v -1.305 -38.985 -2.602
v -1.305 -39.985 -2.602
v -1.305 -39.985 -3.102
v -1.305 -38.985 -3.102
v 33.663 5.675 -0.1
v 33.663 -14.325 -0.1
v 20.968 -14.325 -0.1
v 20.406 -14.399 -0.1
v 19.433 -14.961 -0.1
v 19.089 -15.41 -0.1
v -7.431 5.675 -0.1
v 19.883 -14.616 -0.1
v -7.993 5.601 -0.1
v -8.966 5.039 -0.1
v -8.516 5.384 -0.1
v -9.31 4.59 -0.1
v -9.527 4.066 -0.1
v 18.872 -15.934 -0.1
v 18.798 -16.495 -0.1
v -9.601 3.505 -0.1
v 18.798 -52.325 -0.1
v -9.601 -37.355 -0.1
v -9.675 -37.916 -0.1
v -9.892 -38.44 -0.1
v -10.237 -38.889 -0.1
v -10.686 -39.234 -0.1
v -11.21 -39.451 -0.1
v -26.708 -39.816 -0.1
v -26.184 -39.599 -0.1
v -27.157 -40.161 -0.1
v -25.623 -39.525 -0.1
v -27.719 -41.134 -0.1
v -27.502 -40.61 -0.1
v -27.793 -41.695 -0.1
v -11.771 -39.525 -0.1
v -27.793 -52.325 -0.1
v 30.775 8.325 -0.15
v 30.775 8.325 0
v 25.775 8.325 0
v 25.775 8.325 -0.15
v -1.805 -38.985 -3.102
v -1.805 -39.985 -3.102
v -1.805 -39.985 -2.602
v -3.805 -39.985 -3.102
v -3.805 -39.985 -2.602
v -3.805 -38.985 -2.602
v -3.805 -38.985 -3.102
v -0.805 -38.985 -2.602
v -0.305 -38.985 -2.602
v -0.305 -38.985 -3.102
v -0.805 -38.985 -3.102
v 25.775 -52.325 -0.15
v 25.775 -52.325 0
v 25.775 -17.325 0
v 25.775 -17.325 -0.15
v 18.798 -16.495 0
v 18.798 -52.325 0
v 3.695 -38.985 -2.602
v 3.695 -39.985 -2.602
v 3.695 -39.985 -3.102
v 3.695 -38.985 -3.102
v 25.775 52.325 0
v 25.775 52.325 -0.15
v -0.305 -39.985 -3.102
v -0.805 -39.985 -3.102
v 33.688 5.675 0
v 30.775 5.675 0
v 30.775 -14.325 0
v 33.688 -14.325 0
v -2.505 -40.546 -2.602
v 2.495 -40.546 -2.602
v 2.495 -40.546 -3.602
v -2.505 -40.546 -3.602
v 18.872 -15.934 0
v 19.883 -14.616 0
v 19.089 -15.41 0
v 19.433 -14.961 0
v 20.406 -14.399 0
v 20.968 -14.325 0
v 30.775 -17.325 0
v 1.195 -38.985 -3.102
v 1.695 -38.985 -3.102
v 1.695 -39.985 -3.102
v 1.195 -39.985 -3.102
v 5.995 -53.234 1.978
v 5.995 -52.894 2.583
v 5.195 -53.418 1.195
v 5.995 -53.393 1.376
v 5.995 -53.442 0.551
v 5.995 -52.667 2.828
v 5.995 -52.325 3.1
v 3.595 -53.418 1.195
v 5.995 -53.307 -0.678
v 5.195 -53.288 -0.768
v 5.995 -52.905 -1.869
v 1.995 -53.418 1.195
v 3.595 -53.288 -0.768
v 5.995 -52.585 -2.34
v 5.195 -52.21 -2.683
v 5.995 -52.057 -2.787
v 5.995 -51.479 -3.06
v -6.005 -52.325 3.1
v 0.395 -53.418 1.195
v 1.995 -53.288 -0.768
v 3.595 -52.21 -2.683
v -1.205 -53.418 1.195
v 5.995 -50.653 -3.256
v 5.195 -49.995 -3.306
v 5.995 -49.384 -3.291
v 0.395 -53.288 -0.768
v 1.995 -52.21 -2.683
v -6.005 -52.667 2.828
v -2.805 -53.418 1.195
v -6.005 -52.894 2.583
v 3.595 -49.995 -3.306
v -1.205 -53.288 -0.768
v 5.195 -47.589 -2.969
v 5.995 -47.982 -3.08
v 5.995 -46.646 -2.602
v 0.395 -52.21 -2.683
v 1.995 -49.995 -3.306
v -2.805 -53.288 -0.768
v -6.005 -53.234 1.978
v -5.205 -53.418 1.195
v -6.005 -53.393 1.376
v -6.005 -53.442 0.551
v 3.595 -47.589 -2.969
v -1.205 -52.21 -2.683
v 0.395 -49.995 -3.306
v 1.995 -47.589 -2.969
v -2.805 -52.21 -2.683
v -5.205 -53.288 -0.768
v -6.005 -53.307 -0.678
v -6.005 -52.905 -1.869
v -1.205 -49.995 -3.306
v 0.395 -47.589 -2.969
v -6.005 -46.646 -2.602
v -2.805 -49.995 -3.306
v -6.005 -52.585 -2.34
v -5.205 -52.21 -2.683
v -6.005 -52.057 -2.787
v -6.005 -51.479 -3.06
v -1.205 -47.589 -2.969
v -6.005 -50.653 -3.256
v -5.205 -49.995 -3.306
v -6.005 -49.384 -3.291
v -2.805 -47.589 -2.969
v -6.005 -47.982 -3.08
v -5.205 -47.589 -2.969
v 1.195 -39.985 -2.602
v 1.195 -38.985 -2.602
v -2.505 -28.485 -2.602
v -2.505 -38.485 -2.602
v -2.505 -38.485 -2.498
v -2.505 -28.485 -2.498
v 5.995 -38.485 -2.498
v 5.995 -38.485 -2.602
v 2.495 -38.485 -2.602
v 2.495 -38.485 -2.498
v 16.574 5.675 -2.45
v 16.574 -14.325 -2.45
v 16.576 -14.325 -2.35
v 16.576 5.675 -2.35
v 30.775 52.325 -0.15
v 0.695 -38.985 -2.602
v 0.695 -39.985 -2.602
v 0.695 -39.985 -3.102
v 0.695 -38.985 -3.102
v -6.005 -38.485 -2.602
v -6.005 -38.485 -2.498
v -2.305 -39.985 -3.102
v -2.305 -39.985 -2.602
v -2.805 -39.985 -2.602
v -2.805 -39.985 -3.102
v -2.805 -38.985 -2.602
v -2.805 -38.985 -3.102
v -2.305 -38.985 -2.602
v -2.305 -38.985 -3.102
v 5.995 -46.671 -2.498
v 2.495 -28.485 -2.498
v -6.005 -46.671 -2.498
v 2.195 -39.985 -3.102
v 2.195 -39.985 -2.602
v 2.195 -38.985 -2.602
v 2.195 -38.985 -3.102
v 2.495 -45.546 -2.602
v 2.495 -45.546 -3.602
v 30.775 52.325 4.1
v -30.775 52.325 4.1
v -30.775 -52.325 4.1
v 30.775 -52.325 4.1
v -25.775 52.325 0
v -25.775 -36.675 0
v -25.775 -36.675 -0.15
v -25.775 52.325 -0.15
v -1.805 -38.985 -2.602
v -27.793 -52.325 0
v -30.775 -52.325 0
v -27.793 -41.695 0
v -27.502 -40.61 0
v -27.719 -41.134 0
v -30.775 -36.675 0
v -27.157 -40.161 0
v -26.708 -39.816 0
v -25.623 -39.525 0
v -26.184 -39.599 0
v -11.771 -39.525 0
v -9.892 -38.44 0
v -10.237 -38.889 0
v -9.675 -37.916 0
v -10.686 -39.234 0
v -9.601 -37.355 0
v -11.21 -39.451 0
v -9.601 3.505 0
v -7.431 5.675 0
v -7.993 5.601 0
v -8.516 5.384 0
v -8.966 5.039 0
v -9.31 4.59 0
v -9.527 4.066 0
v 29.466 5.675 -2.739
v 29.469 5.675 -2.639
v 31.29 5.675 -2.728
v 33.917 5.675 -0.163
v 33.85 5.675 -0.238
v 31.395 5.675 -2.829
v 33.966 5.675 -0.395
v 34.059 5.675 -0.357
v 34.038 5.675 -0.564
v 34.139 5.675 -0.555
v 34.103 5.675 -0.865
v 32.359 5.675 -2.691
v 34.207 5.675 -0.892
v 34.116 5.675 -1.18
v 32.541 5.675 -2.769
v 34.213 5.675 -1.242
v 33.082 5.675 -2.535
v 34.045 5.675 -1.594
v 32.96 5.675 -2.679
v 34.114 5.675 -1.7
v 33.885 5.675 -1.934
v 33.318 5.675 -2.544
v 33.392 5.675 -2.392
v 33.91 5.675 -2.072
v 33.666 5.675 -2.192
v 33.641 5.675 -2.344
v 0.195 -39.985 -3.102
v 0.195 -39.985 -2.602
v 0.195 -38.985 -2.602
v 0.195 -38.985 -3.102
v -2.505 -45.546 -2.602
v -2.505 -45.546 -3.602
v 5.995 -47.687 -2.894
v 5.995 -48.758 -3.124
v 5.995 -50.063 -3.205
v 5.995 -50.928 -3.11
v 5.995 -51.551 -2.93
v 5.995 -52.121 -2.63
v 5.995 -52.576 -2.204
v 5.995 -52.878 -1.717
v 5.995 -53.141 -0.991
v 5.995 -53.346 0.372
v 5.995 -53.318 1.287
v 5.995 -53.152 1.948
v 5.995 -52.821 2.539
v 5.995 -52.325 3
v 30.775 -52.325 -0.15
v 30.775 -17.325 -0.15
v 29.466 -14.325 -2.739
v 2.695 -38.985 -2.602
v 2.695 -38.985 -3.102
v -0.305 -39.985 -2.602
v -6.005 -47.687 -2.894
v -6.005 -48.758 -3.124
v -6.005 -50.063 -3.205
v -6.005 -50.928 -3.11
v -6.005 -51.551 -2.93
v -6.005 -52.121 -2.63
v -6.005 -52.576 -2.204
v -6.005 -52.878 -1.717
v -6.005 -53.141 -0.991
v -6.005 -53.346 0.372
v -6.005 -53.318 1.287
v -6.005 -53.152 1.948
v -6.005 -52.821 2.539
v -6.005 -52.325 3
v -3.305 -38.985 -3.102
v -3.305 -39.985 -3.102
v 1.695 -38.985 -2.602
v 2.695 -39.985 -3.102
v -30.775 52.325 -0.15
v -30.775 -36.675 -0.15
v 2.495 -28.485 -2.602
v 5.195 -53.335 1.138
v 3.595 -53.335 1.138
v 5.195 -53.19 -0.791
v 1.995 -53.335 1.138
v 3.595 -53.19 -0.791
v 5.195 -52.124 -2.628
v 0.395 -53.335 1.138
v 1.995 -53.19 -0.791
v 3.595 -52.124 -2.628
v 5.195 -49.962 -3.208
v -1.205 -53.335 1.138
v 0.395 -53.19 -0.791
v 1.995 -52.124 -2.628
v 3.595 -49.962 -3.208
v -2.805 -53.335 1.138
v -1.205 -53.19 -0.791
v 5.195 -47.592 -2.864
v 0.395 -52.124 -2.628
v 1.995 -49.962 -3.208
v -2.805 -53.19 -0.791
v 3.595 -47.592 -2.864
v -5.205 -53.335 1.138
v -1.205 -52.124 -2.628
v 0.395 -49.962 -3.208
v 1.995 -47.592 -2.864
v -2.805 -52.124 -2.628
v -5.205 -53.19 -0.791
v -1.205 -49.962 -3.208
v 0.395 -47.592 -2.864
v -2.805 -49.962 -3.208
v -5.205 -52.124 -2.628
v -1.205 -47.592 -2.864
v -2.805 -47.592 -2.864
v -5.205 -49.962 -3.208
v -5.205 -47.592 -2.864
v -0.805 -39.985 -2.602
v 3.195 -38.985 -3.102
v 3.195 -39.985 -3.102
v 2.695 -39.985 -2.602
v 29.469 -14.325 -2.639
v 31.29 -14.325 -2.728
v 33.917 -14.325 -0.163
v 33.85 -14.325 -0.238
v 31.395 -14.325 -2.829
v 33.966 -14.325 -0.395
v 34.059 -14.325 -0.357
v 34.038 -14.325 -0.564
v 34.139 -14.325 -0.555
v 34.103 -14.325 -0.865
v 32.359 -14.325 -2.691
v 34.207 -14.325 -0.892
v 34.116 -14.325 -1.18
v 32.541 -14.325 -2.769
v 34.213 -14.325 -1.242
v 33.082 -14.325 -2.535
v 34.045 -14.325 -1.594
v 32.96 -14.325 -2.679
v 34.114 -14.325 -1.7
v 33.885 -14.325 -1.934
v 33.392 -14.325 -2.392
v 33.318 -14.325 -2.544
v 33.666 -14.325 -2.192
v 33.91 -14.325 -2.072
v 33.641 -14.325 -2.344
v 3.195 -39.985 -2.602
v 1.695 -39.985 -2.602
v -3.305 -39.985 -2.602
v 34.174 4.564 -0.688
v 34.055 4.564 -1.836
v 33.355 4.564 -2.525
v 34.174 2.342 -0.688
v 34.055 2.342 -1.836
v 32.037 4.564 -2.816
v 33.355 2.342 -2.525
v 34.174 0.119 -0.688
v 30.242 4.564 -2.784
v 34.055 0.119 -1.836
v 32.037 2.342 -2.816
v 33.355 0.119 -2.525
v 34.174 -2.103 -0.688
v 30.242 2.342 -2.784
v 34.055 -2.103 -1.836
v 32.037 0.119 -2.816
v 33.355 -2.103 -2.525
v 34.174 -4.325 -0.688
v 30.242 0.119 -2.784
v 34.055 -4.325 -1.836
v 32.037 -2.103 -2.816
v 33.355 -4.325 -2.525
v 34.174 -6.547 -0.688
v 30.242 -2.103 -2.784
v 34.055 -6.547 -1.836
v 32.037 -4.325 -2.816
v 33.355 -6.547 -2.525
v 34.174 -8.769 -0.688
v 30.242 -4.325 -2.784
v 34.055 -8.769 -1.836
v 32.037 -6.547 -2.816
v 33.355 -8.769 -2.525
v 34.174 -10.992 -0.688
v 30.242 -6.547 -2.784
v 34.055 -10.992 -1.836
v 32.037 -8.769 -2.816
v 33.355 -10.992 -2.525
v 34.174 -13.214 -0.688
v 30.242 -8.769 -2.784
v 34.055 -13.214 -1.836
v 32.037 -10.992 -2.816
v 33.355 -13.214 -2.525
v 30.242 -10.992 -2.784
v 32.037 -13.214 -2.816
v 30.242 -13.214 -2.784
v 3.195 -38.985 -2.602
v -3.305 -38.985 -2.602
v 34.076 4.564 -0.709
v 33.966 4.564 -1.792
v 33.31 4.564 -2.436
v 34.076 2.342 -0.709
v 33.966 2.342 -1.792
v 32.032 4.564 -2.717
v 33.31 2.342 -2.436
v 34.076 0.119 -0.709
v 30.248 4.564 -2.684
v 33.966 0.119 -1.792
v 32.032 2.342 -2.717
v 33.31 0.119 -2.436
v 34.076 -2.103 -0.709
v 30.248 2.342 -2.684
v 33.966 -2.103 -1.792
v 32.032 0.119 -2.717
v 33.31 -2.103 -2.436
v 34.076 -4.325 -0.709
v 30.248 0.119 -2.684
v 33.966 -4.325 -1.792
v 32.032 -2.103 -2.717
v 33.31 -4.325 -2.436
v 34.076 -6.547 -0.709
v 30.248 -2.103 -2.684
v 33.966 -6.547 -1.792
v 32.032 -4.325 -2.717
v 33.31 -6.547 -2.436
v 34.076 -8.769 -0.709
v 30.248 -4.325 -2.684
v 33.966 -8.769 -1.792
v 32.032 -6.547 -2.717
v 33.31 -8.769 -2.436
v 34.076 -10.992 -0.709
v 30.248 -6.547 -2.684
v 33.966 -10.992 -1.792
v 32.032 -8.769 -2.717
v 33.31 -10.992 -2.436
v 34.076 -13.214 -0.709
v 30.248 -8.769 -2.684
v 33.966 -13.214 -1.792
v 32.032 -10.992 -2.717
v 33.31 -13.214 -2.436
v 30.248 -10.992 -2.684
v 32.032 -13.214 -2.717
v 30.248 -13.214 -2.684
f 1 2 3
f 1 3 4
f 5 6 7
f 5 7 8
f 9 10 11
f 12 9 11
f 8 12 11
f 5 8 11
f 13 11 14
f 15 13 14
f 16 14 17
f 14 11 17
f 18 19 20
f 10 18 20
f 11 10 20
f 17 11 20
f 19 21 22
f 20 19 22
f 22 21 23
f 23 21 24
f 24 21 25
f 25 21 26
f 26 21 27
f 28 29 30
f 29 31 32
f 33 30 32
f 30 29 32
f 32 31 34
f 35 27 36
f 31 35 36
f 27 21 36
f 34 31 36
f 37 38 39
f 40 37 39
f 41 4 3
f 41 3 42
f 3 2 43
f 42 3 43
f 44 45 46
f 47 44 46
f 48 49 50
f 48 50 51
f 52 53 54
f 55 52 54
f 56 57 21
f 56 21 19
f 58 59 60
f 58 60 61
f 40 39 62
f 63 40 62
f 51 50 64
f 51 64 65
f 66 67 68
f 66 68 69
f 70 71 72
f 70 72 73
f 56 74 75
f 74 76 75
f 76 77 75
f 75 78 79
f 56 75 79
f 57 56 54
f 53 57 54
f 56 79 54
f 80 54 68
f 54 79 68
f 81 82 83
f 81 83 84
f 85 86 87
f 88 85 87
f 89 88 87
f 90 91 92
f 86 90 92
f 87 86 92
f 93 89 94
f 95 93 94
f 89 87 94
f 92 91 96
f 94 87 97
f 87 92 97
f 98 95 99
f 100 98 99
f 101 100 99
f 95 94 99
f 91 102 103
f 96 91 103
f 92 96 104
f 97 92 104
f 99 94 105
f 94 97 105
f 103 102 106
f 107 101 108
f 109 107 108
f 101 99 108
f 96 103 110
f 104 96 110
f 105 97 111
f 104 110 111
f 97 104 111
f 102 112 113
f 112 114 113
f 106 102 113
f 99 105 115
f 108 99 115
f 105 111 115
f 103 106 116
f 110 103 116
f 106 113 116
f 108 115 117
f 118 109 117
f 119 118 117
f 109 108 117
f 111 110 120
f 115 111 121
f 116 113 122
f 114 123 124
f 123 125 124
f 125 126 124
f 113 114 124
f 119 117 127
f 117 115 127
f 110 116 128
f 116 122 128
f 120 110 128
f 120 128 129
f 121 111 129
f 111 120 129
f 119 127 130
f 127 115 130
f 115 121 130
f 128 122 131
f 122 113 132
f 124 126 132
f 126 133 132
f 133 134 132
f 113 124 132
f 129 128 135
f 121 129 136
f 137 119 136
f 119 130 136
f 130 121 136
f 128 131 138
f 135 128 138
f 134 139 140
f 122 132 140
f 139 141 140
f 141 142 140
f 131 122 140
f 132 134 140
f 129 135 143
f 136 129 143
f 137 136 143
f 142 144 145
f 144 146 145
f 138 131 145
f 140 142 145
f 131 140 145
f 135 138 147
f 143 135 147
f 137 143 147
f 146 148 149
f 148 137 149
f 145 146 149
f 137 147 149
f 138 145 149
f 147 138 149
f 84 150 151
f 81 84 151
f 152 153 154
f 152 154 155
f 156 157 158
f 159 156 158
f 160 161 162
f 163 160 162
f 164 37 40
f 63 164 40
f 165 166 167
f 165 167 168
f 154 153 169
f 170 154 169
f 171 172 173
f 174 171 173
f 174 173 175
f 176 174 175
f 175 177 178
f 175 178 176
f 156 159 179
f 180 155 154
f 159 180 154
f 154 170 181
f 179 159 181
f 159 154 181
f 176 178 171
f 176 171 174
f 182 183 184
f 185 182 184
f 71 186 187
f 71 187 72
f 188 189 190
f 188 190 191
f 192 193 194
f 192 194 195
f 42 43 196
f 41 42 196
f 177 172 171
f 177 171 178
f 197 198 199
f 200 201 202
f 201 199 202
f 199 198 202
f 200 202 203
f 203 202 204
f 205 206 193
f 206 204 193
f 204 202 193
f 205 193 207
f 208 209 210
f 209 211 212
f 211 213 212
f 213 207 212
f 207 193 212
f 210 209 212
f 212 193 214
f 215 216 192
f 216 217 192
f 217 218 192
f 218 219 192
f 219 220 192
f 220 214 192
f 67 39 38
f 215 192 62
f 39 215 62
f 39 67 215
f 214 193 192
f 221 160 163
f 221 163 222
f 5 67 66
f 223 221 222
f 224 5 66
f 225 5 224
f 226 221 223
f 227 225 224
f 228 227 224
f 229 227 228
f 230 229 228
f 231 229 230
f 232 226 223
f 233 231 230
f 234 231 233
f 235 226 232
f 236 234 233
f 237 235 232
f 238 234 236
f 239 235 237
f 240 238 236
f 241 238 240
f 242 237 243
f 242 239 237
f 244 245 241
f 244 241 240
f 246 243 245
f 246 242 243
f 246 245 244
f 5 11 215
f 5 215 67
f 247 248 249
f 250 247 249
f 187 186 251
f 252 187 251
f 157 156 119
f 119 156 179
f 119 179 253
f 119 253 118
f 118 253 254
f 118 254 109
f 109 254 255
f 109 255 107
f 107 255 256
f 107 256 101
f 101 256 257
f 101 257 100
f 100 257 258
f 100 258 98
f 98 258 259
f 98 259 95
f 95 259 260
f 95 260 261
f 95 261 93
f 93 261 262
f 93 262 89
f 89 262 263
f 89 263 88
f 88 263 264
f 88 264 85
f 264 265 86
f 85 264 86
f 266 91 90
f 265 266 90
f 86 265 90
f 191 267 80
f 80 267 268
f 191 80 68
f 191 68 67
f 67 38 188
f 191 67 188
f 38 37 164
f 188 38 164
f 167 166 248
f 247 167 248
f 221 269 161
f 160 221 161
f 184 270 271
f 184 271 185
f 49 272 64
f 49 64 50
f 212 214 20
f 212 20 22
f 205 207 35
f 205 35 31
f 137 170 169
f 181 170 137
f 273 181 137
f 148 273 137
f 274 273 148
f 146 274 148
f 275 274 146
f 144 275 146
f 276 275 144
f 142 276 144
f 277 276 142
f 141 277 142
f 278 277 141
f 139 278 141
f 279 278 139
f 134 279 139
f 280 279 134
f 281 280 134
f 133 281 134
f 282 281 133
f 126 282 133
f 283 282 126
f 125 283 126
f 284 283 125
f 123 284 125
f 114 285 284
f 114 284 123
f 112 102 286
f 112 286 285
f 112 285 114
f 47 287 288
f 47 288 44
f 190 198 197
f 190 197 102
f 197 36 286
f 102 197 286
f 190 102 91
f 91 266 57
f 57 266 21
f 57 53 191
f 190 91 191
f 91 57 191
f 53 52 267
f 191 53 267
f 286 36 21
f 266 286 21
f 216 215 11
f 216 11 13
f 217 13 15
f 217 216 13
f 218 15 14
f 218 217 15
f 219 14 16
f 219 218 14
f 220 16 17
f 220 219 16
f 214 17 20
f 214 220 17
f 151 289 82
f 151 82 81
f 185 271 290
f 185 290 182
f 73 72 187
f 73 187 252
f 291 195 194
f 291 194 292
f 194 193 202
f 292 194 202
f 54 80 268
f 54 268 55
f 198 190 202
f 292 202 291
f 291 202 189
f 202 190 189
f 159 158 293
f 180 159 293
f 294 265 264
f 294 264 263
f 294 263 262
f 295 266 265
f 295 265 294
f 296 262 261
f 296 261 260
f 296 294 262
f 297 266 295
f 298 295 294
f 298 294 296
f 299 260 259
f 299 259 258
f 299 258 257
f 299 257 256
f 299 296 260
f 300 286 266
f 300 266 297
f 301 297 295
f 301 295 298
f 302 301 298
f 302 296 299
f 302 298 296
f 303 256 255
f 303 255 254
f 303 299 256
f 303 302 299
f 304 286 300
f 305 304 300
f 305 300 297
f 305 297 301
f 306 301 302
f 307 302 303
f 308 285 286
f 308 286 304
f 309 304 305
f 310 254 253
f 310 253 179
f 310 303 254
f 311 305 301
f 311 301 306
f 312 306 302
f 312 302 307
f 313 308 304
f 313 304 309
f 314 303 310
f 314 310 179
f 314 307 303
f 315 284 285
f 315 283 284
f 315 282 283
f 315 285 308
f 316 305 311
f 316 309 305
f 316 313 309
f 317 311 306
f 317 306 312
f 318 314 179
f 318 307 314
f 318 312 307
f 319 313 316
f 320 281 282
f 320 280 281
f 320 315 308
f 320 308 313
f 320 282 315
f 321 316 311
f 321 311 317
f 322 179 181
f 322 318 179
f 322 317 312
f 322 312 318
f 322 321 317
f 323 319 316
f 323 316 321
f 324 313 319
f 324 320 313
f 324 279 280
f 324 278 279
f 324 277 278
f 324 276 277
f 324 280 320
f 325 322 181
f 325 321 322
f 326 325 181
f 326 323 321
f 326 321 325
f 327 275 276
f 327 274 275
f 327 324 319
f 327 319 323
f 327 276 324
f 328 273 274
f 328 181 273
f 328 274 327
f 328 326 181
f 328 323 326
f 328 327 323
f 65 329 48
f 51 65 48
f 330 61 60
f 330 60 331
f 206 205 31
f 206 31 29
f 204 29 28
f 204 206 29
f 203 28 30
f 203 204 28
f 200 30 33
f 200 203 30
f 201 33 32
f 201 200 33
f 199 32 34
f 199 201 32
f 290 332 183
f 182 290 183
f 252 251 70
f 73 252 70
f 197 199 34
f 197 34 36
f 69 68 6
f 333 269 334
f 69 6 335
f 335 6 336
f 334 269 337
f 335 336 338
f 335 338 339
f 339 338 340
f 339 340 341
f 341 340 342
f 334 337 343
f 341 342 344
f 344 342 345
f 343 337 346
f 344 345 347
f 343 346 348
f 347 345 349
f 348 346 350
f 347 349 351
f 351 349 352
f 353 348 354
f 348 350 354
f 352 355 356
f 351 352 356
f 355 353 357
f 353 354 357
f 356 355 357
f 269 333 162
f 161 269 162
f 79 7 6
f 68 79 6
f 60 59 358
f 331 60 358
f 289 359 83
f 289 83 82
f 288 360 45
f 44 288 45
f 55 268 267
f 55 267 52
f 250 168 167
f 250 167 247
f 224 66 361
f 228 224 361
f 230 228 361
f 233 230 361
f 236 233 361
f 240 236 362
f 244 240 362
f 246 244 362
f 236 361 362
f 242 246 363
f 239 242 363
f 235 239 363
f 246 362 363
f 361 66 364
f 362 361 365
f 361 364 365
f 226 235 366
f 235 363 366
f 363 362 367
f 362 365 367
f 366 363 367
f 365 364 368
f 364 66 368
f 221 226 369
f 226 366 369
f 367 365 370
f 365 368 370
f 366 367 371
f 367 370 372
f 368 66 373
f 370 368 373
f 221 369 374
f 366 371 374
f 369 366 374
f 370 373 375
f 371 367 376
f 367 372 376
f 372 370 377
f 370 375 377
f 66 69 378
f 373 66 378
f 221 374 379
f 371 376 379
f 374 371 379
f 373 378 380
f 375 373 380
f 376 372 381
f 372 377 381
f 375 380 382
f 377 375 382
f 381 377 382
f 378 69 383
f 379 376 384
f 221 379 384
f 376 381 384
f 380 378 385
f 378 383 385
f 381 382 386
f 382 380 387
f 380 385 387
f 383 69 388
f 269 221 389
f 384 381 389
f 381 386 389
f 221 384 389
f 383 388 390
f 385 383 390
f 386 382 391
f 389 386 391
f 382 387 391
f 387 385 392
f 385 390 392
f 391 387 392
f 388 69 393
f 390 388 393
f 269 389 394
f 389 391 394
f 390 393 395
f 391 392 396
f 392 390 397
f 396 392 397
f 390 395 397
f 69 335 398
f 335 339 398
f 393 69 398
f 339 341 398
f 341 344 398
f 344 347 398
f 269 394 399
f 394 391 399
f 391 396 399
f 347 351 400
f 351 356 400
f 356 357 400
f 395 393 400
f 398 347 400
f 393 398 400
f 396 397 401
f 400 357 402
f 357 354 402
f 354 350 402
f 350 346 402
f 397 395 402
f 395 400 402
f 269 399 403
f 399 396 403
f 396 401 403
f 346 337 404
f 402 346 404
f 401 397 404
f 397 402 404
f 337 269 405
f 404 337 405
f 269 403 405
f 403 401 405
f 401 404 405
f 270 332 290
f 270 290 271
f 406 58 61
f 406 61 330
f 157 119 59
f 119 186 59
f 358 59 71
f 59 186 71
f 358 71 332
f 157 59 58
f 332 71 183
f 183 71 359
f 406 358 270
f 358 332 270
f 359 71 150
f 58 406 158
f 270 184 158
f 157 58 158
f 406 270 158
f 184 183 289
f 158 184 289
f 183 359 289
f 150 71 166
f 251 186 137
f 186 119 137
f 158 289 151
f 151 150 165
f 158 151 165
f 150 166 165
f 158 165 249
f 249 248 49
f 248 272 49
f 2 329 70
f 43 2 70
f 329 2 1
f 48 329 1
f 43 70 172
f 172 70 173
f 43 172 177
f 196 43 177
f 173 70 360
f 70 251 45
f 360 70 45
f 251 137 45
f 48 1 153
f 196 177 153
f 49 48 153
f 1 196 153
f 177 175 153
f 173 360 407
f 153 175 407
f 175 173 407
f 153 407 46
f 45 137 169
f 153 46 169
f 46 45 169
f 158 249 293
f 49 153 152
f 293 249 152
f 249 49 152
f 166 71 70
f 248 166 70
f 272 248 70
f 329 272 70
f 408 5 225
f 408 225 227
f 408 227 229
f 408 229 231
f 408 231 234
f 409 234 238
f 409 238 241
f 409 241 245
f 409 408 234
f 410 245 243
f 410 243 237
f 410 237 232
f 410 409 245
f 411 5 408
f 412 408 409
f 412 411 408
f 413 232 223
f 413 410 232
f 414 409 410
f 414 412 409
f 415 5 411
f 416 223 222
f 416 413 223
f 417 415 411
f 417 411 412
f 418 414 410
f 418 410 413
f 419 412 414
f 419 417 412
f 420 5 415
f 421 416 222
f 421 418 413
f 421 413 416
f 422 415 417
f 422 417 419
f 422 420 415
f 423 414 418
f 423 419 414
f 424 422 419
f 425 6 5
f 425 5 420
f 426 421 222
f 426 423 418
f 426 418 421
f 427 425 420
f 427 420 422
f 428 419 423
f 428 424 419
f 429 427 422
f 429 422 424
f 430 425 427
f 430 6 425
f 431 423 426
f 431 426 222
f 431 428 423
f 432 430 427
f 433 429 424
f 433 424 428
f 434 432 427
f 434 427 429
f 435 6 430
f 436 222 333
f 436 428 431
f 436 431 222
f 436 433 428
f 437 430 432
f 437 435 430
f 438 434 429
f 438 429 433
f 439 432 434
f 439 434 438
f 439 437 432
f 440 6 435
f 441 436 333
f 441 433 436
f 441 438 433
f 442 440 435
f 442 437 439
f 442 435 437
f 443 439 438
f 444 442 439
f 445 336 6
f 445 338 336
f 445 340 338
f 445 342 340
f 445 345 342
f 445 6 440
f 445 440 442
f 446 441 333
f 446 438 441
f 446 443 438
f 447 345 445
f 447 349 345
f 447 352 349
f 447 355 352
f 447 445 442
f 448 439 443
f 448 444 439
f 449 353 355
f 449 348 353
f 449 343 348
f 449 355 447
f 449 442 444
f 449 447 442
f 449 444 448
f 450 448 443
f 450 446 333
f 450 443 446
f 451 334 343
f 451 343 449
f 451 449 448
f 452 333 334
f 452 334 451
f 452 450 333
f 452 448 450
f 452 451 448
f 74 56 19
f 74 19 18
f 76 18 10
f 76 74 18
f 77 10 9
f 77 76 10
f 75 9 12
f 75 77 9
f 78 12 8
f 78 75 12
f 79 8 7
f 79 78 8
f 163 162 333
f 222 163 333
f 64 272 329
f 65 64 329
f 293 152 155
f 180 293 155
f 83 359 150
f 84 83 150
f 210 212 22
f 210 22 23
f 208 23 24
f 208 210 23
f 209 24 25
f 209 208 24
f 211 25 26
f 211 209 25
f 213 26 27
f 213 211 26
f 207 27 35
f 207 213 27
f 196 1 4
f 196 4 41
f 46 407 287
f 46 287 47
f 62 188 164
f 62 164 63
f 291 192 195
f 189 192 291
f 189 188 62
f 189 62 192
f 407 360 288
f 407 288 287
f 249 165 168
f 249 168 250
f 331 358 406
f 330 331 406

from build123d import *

# Parameters (mm, degrees)
SKETCH_1_W          = 61.55
SKETCH_1_H          = 104.65
EXTRUDE_1_DEPTH     = 4.1
EXTRUDE_2_DEPTH     = 0.1
SKETCH_13_W         = 5
SKETCH_13_H         = 89
SKETCH_13_H_2       = 44
SKETCH_13_H_3       = 35
EXTRUDE_3_DEPTH     = 0.15
SWEEP_START         = -14.325
SWEEP_1_DEPTH       = 20
SWEEP_START_2       = -6.005
SWEEP_2_DEPTH       = 12
CUT_EXTRUDE_1_REACH = 65.813
SKETCH_21_W         = 3.5
SKETCH_21_H         = 10
SKETCH_22_W         = 5
SKETCH_22_H         = 5
EXTRUDE_4_DEPTH     = 1
SKETCH_22_3_W       = 0.5
SKETCH_22_3_H       = 1
EXTRUDE_5_DEPTH     = 0.5


# Read off the part's stored shape, not the designer's step: 扫描1, 扫描2
with BuildPart() as part:
    # 草图1 → 凸台-拉伸1 (new body)
    with BuildSketch(Plane.XY):
        Rectangle(SKETCH_1_W, SKETCH_1_H)
    extrude(amount=EXTRUDE_1_DEPTH)

    # 草图12 → 凸台-拉伸2 (add)
    with BuildSketch(Plane(origin=(0, 0, 0), x_dir=(-1, 0, 0), z_dir=(0, 0, -1))):
        with BuildLine():
            Line((-30.775, 5.675), (7.43097714, 5.675))
            ThreePointArc((7.43097714, 5.675), (8.96553195, 5.039366586), (9.601165364, 3.504811776))
            Line((9.601165364, 3.504811776), (9.601165364, -37.354811776))
            ThreePointArc((9.601165364, -37.354811776), (10.236798778, -38.889366586), (11.771353588, -39.525))
            Line((11.771353588, -39.525), (25.622658883, -39.525))
            ThreePointArc((25.622658883, -39.525), (27.157213692, -40.160633414), (27.792847106, -41.695188224))
            Line((27.792847106, -41.695188224), (27.792847106, -52.325))
            Line((27.792847106, -52.325), (-18.797778056, -52.325))
            Line((-18.797778056, -52.325), (-18.797778056, -16.495188224))
            ThreePointArc((-18.797778056, -16.495188224), (-19.43341147, -14.960633414), (-20.96796628, -14.325))
            Line((-20.96796628, -14.325), (-30.775, -14.325))
            Line((-30.775, -14.325), (-30.775, 5.675))
        make_face()
    extrude(amount=EXTRUDE_2_DEPTH)

    # 草图13 → 凸台-拉伸3 (add)
    with BuildSketch(Plane(origin=(0, 0, 0), x_dir=(-1, 0, 0), z_dir=(0, 0, -1))):
        with Locations((28.275, 7.825)):
            Rectangle(SKETCH_13_W, SKETCH_13_H)
        with Locations((-28.275, 30.325)):
            Rectangle(SKETCH_13_W, SKETCH_13_H_2)
        with Locations((-28.275, -34.825)):
            Rectangle(SKETCH_13_W, SKETCH_13_H_3)
    extrude(amount=EXTRUDE_3_DEPTH)

    # 扫描1 outline → 扫描1 (add)
    with BuildSketch(Plane(origin=(0, 0, 0), x_dir=(1, 0, 0), z_dir=(0, 1, 0)).offset(SWEEP_START)):
        with BuildLine():
            Line((30.775, 0), (33.688057754, 0))
            add(Edge.make_bspline(
                [(33.688057754, 0), (33.740094349, 0.030384855), (33.842167666, 0.089986814), (33.957599344, 0.199336205), (34.055275833, 0.337544191), (34.127351146, 0.503103592), (34.185512523, 0.716829871), (34.22259154, 0.985198024), (34.217211516, 1.305147843), (34.157564693, 1.596323551), (34.059081534, 1.841158616), (33.942865451, 2.037727084), (33.787885639, 2.222839862), (33.590692863, 2.391010577), (33.262024043, 2.589254607), (32.734303663, 2.759632394), (32.006537514, 2.830109489), (31.159482774, 2.834077419), (30.301363299, 2.787487983), (29.724318905, 2.754110628), (29.465689882, 2.739151029)],
                knots=[0, 0, 0, 0, 0.022394077, 0.043927504, 0.06594757, 0.090294372, 0.118608139, 0.159927725, 0.205818656, 0.25470695, 0.285347598, 0.317202924, 0.350795774, 0.386909923, 0.42653968, 0.513682935, 0.622352859, 0.744271405, 0.885383452, 1, 1, 1, 1], degree=3))
            Line((29.465689882, 2.739151029), (16.573878781, 2.449987427))
            Line((16.573878781, 2.449987427), (16.576121219, 2.350012573))
            Line((16.576121219, 2.350012573), (29.468846669, 2.639196684))
            add(Edge.make_bspline(
                [(33.66280425, 0.1), (33.701165427, 0.12284106), (33.77641348, 0.167645351), (33.88316176, 0.26642733), (33.966512799, 0.385635161), (34.032372412, 0.535121016), (34.087077442, 0.736116999), (34.122405453, 0.991235451), (34.117202793, 1.294498152), (34.060993674, 1.568287463), (33.969014807, 1.796825073), (33.860895162, 1.979670143), (33.716718378, 2.151914558), (33.532385119, 2.309217599), (33.222301128, 2.496419386), (32.71697835, 2.660403065), (32.002919105, 2.730108386), (31.162255161, 2.734053994), (30.308880523, 2.687749647), (29.728825185, 2.654223135), (29.468846669, 2.639196684)],
                knots=[0, 0, 0, 0, 0.022394077, 0.043927504, 0.06594757, 0.090294372, 0.118608139, 0.159927725, 0.205818656, 0.25470695, 0.285347598, 0.317202924, 0.350795774, 0.386909923, 0.42653968, 0.513682935, 0.622352859, 0.744271405, 0.885383452, 1, 1, 1, 1], degree=3))
            Line((33.66280425, 0.1), (30.775, 0.1))
            Line((30.775, 0.1), (30.775, 0))
        make_face()
    extrude(amount=SWEEP_1_DEPTH)

    # 扫描2 outline → 扫描2 (add)
    with BuildSketch(Plane.YZ.offset(SWEEP_START_2)):
        with BuildLine():
            add(Edge.make_bspline(
                [(-52.325, 3), (-52.460602146, 2.893750812), (-52.722932906, 2.688205168), (-53.009596176, 2.286811717), (-53.236110287, 1.775702365), (-53.359405567, 1.129360272), (-53.359062945, 0.238903879), (-53.229025848, -0.783276027), (-52.933769169, -1.695551183), (-52.526896187, -2.296702581), (-52.132903591, -2.646463291), (-51.661381942, -2.902920315), (-50.942443081, -3.139445785), (-49.94695976, -3.245581242), (-48.75217865, -3.148841506), (-47.635336399, -2.915993871), (-46.974786487, -2.629681533), (-46.67140425, -2.498181891)],
                knots=[0, 0, 0, 0, 0.043360734, 0.083884028, 0.123581472, 0.184240498, 0.247655218, 0.345647149, 0.439787351, 0.484257058, 0.527954224, 0.57258299, 0.619125258, 0.717850297, 0.820060491, 0.917356055, 1, 1, 1, 1], degree=3))
            Line((-52.325, 3), (-52.325, 3.1))
            add(Edge.make_bspline(
                [(-52.325, 3.1), (-52.468608186, 2.993246309), (-52.746427128, 2.786724673), (-53.057421939, 2.375880968), (-53.306118632, 1.849117463), (-53.443742145, 1.185180174), (-53.453016098, 0.27667256), (-53.326868431, -0.756873175), (-53.036730374, -1.692169497), (-52.625569397, -2.326691599), (-52.219376389, -2.703311261), (-51.732982096, -2.977735995), (-50.993631594, -3.23110648), (-49.979600344, -3.345075131), (-48.766358256, -3.253086402), (-47.634912854, -3.022591855), (-46.957432057, -2.73424992), (-46.646273679, -2.601818109)],
                knots=[0, 0, 0, 0, 0.043360734, 0.083884028, 0.123581472, 0.184240498, 0.247655218, 0.345647149, 0.439787351, 0.484257058, 0.527954224, 0.57258299, 0.619125258, 0.717850297, 0.820060491, 0.917356055, 1, 1, 1, 1], degree=3))
            Line((-46.646273679, -2.601818109), (-28.485, -2.601818109))
            Line((-28.485, -2.601818109), (-28.485, -2.498181891))
            Line((-28.485, -2.498181891), (-46.67140425, -2.498181891))
        make_face()
    extrude(amount=SWEEP_2_DEPTH)

    # 草图21 → 切除-拉伸1 (cut, up to next)
    with BuildSketch(Plane(origin=(0, 0, -2.601818109), x_dir=(-1, 0, 0), z_dir=(0, 0, -1)), mode=Mode.PRIVATE) as cut_extrude_1_sk1:
        with Locations((-4.245, -33.485)):
            Rectangle(SKETCH_21_W, SKETCH_21_H)
    cut_extrude_1_tool1 = extrude(cut_extrude_1_sk1.sketch, amount=-CUT_EXTRUDE_1_REACH, mode=Mode.PRIVATE) & part.part
    # 草图21 → 切除-拉伸1 (cut, up to next)
    with BuildSketch(Plane(origin=(0, 0, -2.601818109), x_dir=(-1, 0, 0), z_dir=(0, 0, -1)), mode=Mode.PRIVATE) as cut_extrude_1_sk2:
        with Locations((4.255, -33.485)):
            Rectangle(SKETCH_21_W, SKETCH_21_H)
    cut_extrude_1_tool2 = extrude(cut_extrude_1_sk2.sketch, amount=-CUT_EXTRUDE_1_REACH, mode=Mode.PRIVATE) & part.part
    add(cut_extrude_1_tool1.solids().sort_by_distance((4.245, -33.485, -2.601818))[0], mode=Mode.SUBTRACT)
    add(cut_extrude_1_tool2.solids().sort_by_distance((-4.255, -33.485, -2.601818))[0], mode=Mode.SUBTRACT)

    # 草图22 → 凸台-拉伸4 (add)
    with BuildSketch(Plane(origin=(0, 0, -2.601818109), x_dir=(-1, 0, 0), z_dir=(0, 0, -1))):
        with Locations((0.005, -43.046273679)):
            Rectangle(SKETCH_22_W, SKETCH_22_H)
    extrude(amount=EXTRUDE_4_DEPTH)

    # 草图22<3> → 凸台-拉伸5 (add)
    with BuildSketch(Plane(origin=(0, 0, -2.601818109), x_dir=(-1, 0, 0), z_dir=(0, 0, -1))):
        with Locations((-3.445, -39.485)):
            Rectangle(SKETCH_22_3_W, SKETCH_22_3_H)
        with Locations((-2.445, -39.485)):
            Rectangle(SKETCH_22_3_W, SKETCH_22_3_H)
        with Locations((-1.445, -39.485)):
            Rectangle(SKETCH_22_3_W, SKETCH_22_3_H)
        with Locations((-0.445, -39.485)):
            Rectangle(SKETCH_22_3_W, SKETCH_22_3_H)
        with Locations((0.555, -39.485)):
            Rectangle(SKETCH_22_3_W, SKETCH_22_3_H)
        with Locations((1.555, -39.485)):
            Rectangle(SKETCH_22_3_W, SKETCH_22_3_H)
        with Locations((2.555, -39.485)):
            Rectangle(SKETCH_22_3_W, SKETCH_22_3_H)
        with Locations((3.555, -39.485)):
            Rectangle(SKETCH_22_3_W, SKETCH_22_3_H)
    extrude(amount=EXTRUDE_5_DEPTH)


solid = part.part
